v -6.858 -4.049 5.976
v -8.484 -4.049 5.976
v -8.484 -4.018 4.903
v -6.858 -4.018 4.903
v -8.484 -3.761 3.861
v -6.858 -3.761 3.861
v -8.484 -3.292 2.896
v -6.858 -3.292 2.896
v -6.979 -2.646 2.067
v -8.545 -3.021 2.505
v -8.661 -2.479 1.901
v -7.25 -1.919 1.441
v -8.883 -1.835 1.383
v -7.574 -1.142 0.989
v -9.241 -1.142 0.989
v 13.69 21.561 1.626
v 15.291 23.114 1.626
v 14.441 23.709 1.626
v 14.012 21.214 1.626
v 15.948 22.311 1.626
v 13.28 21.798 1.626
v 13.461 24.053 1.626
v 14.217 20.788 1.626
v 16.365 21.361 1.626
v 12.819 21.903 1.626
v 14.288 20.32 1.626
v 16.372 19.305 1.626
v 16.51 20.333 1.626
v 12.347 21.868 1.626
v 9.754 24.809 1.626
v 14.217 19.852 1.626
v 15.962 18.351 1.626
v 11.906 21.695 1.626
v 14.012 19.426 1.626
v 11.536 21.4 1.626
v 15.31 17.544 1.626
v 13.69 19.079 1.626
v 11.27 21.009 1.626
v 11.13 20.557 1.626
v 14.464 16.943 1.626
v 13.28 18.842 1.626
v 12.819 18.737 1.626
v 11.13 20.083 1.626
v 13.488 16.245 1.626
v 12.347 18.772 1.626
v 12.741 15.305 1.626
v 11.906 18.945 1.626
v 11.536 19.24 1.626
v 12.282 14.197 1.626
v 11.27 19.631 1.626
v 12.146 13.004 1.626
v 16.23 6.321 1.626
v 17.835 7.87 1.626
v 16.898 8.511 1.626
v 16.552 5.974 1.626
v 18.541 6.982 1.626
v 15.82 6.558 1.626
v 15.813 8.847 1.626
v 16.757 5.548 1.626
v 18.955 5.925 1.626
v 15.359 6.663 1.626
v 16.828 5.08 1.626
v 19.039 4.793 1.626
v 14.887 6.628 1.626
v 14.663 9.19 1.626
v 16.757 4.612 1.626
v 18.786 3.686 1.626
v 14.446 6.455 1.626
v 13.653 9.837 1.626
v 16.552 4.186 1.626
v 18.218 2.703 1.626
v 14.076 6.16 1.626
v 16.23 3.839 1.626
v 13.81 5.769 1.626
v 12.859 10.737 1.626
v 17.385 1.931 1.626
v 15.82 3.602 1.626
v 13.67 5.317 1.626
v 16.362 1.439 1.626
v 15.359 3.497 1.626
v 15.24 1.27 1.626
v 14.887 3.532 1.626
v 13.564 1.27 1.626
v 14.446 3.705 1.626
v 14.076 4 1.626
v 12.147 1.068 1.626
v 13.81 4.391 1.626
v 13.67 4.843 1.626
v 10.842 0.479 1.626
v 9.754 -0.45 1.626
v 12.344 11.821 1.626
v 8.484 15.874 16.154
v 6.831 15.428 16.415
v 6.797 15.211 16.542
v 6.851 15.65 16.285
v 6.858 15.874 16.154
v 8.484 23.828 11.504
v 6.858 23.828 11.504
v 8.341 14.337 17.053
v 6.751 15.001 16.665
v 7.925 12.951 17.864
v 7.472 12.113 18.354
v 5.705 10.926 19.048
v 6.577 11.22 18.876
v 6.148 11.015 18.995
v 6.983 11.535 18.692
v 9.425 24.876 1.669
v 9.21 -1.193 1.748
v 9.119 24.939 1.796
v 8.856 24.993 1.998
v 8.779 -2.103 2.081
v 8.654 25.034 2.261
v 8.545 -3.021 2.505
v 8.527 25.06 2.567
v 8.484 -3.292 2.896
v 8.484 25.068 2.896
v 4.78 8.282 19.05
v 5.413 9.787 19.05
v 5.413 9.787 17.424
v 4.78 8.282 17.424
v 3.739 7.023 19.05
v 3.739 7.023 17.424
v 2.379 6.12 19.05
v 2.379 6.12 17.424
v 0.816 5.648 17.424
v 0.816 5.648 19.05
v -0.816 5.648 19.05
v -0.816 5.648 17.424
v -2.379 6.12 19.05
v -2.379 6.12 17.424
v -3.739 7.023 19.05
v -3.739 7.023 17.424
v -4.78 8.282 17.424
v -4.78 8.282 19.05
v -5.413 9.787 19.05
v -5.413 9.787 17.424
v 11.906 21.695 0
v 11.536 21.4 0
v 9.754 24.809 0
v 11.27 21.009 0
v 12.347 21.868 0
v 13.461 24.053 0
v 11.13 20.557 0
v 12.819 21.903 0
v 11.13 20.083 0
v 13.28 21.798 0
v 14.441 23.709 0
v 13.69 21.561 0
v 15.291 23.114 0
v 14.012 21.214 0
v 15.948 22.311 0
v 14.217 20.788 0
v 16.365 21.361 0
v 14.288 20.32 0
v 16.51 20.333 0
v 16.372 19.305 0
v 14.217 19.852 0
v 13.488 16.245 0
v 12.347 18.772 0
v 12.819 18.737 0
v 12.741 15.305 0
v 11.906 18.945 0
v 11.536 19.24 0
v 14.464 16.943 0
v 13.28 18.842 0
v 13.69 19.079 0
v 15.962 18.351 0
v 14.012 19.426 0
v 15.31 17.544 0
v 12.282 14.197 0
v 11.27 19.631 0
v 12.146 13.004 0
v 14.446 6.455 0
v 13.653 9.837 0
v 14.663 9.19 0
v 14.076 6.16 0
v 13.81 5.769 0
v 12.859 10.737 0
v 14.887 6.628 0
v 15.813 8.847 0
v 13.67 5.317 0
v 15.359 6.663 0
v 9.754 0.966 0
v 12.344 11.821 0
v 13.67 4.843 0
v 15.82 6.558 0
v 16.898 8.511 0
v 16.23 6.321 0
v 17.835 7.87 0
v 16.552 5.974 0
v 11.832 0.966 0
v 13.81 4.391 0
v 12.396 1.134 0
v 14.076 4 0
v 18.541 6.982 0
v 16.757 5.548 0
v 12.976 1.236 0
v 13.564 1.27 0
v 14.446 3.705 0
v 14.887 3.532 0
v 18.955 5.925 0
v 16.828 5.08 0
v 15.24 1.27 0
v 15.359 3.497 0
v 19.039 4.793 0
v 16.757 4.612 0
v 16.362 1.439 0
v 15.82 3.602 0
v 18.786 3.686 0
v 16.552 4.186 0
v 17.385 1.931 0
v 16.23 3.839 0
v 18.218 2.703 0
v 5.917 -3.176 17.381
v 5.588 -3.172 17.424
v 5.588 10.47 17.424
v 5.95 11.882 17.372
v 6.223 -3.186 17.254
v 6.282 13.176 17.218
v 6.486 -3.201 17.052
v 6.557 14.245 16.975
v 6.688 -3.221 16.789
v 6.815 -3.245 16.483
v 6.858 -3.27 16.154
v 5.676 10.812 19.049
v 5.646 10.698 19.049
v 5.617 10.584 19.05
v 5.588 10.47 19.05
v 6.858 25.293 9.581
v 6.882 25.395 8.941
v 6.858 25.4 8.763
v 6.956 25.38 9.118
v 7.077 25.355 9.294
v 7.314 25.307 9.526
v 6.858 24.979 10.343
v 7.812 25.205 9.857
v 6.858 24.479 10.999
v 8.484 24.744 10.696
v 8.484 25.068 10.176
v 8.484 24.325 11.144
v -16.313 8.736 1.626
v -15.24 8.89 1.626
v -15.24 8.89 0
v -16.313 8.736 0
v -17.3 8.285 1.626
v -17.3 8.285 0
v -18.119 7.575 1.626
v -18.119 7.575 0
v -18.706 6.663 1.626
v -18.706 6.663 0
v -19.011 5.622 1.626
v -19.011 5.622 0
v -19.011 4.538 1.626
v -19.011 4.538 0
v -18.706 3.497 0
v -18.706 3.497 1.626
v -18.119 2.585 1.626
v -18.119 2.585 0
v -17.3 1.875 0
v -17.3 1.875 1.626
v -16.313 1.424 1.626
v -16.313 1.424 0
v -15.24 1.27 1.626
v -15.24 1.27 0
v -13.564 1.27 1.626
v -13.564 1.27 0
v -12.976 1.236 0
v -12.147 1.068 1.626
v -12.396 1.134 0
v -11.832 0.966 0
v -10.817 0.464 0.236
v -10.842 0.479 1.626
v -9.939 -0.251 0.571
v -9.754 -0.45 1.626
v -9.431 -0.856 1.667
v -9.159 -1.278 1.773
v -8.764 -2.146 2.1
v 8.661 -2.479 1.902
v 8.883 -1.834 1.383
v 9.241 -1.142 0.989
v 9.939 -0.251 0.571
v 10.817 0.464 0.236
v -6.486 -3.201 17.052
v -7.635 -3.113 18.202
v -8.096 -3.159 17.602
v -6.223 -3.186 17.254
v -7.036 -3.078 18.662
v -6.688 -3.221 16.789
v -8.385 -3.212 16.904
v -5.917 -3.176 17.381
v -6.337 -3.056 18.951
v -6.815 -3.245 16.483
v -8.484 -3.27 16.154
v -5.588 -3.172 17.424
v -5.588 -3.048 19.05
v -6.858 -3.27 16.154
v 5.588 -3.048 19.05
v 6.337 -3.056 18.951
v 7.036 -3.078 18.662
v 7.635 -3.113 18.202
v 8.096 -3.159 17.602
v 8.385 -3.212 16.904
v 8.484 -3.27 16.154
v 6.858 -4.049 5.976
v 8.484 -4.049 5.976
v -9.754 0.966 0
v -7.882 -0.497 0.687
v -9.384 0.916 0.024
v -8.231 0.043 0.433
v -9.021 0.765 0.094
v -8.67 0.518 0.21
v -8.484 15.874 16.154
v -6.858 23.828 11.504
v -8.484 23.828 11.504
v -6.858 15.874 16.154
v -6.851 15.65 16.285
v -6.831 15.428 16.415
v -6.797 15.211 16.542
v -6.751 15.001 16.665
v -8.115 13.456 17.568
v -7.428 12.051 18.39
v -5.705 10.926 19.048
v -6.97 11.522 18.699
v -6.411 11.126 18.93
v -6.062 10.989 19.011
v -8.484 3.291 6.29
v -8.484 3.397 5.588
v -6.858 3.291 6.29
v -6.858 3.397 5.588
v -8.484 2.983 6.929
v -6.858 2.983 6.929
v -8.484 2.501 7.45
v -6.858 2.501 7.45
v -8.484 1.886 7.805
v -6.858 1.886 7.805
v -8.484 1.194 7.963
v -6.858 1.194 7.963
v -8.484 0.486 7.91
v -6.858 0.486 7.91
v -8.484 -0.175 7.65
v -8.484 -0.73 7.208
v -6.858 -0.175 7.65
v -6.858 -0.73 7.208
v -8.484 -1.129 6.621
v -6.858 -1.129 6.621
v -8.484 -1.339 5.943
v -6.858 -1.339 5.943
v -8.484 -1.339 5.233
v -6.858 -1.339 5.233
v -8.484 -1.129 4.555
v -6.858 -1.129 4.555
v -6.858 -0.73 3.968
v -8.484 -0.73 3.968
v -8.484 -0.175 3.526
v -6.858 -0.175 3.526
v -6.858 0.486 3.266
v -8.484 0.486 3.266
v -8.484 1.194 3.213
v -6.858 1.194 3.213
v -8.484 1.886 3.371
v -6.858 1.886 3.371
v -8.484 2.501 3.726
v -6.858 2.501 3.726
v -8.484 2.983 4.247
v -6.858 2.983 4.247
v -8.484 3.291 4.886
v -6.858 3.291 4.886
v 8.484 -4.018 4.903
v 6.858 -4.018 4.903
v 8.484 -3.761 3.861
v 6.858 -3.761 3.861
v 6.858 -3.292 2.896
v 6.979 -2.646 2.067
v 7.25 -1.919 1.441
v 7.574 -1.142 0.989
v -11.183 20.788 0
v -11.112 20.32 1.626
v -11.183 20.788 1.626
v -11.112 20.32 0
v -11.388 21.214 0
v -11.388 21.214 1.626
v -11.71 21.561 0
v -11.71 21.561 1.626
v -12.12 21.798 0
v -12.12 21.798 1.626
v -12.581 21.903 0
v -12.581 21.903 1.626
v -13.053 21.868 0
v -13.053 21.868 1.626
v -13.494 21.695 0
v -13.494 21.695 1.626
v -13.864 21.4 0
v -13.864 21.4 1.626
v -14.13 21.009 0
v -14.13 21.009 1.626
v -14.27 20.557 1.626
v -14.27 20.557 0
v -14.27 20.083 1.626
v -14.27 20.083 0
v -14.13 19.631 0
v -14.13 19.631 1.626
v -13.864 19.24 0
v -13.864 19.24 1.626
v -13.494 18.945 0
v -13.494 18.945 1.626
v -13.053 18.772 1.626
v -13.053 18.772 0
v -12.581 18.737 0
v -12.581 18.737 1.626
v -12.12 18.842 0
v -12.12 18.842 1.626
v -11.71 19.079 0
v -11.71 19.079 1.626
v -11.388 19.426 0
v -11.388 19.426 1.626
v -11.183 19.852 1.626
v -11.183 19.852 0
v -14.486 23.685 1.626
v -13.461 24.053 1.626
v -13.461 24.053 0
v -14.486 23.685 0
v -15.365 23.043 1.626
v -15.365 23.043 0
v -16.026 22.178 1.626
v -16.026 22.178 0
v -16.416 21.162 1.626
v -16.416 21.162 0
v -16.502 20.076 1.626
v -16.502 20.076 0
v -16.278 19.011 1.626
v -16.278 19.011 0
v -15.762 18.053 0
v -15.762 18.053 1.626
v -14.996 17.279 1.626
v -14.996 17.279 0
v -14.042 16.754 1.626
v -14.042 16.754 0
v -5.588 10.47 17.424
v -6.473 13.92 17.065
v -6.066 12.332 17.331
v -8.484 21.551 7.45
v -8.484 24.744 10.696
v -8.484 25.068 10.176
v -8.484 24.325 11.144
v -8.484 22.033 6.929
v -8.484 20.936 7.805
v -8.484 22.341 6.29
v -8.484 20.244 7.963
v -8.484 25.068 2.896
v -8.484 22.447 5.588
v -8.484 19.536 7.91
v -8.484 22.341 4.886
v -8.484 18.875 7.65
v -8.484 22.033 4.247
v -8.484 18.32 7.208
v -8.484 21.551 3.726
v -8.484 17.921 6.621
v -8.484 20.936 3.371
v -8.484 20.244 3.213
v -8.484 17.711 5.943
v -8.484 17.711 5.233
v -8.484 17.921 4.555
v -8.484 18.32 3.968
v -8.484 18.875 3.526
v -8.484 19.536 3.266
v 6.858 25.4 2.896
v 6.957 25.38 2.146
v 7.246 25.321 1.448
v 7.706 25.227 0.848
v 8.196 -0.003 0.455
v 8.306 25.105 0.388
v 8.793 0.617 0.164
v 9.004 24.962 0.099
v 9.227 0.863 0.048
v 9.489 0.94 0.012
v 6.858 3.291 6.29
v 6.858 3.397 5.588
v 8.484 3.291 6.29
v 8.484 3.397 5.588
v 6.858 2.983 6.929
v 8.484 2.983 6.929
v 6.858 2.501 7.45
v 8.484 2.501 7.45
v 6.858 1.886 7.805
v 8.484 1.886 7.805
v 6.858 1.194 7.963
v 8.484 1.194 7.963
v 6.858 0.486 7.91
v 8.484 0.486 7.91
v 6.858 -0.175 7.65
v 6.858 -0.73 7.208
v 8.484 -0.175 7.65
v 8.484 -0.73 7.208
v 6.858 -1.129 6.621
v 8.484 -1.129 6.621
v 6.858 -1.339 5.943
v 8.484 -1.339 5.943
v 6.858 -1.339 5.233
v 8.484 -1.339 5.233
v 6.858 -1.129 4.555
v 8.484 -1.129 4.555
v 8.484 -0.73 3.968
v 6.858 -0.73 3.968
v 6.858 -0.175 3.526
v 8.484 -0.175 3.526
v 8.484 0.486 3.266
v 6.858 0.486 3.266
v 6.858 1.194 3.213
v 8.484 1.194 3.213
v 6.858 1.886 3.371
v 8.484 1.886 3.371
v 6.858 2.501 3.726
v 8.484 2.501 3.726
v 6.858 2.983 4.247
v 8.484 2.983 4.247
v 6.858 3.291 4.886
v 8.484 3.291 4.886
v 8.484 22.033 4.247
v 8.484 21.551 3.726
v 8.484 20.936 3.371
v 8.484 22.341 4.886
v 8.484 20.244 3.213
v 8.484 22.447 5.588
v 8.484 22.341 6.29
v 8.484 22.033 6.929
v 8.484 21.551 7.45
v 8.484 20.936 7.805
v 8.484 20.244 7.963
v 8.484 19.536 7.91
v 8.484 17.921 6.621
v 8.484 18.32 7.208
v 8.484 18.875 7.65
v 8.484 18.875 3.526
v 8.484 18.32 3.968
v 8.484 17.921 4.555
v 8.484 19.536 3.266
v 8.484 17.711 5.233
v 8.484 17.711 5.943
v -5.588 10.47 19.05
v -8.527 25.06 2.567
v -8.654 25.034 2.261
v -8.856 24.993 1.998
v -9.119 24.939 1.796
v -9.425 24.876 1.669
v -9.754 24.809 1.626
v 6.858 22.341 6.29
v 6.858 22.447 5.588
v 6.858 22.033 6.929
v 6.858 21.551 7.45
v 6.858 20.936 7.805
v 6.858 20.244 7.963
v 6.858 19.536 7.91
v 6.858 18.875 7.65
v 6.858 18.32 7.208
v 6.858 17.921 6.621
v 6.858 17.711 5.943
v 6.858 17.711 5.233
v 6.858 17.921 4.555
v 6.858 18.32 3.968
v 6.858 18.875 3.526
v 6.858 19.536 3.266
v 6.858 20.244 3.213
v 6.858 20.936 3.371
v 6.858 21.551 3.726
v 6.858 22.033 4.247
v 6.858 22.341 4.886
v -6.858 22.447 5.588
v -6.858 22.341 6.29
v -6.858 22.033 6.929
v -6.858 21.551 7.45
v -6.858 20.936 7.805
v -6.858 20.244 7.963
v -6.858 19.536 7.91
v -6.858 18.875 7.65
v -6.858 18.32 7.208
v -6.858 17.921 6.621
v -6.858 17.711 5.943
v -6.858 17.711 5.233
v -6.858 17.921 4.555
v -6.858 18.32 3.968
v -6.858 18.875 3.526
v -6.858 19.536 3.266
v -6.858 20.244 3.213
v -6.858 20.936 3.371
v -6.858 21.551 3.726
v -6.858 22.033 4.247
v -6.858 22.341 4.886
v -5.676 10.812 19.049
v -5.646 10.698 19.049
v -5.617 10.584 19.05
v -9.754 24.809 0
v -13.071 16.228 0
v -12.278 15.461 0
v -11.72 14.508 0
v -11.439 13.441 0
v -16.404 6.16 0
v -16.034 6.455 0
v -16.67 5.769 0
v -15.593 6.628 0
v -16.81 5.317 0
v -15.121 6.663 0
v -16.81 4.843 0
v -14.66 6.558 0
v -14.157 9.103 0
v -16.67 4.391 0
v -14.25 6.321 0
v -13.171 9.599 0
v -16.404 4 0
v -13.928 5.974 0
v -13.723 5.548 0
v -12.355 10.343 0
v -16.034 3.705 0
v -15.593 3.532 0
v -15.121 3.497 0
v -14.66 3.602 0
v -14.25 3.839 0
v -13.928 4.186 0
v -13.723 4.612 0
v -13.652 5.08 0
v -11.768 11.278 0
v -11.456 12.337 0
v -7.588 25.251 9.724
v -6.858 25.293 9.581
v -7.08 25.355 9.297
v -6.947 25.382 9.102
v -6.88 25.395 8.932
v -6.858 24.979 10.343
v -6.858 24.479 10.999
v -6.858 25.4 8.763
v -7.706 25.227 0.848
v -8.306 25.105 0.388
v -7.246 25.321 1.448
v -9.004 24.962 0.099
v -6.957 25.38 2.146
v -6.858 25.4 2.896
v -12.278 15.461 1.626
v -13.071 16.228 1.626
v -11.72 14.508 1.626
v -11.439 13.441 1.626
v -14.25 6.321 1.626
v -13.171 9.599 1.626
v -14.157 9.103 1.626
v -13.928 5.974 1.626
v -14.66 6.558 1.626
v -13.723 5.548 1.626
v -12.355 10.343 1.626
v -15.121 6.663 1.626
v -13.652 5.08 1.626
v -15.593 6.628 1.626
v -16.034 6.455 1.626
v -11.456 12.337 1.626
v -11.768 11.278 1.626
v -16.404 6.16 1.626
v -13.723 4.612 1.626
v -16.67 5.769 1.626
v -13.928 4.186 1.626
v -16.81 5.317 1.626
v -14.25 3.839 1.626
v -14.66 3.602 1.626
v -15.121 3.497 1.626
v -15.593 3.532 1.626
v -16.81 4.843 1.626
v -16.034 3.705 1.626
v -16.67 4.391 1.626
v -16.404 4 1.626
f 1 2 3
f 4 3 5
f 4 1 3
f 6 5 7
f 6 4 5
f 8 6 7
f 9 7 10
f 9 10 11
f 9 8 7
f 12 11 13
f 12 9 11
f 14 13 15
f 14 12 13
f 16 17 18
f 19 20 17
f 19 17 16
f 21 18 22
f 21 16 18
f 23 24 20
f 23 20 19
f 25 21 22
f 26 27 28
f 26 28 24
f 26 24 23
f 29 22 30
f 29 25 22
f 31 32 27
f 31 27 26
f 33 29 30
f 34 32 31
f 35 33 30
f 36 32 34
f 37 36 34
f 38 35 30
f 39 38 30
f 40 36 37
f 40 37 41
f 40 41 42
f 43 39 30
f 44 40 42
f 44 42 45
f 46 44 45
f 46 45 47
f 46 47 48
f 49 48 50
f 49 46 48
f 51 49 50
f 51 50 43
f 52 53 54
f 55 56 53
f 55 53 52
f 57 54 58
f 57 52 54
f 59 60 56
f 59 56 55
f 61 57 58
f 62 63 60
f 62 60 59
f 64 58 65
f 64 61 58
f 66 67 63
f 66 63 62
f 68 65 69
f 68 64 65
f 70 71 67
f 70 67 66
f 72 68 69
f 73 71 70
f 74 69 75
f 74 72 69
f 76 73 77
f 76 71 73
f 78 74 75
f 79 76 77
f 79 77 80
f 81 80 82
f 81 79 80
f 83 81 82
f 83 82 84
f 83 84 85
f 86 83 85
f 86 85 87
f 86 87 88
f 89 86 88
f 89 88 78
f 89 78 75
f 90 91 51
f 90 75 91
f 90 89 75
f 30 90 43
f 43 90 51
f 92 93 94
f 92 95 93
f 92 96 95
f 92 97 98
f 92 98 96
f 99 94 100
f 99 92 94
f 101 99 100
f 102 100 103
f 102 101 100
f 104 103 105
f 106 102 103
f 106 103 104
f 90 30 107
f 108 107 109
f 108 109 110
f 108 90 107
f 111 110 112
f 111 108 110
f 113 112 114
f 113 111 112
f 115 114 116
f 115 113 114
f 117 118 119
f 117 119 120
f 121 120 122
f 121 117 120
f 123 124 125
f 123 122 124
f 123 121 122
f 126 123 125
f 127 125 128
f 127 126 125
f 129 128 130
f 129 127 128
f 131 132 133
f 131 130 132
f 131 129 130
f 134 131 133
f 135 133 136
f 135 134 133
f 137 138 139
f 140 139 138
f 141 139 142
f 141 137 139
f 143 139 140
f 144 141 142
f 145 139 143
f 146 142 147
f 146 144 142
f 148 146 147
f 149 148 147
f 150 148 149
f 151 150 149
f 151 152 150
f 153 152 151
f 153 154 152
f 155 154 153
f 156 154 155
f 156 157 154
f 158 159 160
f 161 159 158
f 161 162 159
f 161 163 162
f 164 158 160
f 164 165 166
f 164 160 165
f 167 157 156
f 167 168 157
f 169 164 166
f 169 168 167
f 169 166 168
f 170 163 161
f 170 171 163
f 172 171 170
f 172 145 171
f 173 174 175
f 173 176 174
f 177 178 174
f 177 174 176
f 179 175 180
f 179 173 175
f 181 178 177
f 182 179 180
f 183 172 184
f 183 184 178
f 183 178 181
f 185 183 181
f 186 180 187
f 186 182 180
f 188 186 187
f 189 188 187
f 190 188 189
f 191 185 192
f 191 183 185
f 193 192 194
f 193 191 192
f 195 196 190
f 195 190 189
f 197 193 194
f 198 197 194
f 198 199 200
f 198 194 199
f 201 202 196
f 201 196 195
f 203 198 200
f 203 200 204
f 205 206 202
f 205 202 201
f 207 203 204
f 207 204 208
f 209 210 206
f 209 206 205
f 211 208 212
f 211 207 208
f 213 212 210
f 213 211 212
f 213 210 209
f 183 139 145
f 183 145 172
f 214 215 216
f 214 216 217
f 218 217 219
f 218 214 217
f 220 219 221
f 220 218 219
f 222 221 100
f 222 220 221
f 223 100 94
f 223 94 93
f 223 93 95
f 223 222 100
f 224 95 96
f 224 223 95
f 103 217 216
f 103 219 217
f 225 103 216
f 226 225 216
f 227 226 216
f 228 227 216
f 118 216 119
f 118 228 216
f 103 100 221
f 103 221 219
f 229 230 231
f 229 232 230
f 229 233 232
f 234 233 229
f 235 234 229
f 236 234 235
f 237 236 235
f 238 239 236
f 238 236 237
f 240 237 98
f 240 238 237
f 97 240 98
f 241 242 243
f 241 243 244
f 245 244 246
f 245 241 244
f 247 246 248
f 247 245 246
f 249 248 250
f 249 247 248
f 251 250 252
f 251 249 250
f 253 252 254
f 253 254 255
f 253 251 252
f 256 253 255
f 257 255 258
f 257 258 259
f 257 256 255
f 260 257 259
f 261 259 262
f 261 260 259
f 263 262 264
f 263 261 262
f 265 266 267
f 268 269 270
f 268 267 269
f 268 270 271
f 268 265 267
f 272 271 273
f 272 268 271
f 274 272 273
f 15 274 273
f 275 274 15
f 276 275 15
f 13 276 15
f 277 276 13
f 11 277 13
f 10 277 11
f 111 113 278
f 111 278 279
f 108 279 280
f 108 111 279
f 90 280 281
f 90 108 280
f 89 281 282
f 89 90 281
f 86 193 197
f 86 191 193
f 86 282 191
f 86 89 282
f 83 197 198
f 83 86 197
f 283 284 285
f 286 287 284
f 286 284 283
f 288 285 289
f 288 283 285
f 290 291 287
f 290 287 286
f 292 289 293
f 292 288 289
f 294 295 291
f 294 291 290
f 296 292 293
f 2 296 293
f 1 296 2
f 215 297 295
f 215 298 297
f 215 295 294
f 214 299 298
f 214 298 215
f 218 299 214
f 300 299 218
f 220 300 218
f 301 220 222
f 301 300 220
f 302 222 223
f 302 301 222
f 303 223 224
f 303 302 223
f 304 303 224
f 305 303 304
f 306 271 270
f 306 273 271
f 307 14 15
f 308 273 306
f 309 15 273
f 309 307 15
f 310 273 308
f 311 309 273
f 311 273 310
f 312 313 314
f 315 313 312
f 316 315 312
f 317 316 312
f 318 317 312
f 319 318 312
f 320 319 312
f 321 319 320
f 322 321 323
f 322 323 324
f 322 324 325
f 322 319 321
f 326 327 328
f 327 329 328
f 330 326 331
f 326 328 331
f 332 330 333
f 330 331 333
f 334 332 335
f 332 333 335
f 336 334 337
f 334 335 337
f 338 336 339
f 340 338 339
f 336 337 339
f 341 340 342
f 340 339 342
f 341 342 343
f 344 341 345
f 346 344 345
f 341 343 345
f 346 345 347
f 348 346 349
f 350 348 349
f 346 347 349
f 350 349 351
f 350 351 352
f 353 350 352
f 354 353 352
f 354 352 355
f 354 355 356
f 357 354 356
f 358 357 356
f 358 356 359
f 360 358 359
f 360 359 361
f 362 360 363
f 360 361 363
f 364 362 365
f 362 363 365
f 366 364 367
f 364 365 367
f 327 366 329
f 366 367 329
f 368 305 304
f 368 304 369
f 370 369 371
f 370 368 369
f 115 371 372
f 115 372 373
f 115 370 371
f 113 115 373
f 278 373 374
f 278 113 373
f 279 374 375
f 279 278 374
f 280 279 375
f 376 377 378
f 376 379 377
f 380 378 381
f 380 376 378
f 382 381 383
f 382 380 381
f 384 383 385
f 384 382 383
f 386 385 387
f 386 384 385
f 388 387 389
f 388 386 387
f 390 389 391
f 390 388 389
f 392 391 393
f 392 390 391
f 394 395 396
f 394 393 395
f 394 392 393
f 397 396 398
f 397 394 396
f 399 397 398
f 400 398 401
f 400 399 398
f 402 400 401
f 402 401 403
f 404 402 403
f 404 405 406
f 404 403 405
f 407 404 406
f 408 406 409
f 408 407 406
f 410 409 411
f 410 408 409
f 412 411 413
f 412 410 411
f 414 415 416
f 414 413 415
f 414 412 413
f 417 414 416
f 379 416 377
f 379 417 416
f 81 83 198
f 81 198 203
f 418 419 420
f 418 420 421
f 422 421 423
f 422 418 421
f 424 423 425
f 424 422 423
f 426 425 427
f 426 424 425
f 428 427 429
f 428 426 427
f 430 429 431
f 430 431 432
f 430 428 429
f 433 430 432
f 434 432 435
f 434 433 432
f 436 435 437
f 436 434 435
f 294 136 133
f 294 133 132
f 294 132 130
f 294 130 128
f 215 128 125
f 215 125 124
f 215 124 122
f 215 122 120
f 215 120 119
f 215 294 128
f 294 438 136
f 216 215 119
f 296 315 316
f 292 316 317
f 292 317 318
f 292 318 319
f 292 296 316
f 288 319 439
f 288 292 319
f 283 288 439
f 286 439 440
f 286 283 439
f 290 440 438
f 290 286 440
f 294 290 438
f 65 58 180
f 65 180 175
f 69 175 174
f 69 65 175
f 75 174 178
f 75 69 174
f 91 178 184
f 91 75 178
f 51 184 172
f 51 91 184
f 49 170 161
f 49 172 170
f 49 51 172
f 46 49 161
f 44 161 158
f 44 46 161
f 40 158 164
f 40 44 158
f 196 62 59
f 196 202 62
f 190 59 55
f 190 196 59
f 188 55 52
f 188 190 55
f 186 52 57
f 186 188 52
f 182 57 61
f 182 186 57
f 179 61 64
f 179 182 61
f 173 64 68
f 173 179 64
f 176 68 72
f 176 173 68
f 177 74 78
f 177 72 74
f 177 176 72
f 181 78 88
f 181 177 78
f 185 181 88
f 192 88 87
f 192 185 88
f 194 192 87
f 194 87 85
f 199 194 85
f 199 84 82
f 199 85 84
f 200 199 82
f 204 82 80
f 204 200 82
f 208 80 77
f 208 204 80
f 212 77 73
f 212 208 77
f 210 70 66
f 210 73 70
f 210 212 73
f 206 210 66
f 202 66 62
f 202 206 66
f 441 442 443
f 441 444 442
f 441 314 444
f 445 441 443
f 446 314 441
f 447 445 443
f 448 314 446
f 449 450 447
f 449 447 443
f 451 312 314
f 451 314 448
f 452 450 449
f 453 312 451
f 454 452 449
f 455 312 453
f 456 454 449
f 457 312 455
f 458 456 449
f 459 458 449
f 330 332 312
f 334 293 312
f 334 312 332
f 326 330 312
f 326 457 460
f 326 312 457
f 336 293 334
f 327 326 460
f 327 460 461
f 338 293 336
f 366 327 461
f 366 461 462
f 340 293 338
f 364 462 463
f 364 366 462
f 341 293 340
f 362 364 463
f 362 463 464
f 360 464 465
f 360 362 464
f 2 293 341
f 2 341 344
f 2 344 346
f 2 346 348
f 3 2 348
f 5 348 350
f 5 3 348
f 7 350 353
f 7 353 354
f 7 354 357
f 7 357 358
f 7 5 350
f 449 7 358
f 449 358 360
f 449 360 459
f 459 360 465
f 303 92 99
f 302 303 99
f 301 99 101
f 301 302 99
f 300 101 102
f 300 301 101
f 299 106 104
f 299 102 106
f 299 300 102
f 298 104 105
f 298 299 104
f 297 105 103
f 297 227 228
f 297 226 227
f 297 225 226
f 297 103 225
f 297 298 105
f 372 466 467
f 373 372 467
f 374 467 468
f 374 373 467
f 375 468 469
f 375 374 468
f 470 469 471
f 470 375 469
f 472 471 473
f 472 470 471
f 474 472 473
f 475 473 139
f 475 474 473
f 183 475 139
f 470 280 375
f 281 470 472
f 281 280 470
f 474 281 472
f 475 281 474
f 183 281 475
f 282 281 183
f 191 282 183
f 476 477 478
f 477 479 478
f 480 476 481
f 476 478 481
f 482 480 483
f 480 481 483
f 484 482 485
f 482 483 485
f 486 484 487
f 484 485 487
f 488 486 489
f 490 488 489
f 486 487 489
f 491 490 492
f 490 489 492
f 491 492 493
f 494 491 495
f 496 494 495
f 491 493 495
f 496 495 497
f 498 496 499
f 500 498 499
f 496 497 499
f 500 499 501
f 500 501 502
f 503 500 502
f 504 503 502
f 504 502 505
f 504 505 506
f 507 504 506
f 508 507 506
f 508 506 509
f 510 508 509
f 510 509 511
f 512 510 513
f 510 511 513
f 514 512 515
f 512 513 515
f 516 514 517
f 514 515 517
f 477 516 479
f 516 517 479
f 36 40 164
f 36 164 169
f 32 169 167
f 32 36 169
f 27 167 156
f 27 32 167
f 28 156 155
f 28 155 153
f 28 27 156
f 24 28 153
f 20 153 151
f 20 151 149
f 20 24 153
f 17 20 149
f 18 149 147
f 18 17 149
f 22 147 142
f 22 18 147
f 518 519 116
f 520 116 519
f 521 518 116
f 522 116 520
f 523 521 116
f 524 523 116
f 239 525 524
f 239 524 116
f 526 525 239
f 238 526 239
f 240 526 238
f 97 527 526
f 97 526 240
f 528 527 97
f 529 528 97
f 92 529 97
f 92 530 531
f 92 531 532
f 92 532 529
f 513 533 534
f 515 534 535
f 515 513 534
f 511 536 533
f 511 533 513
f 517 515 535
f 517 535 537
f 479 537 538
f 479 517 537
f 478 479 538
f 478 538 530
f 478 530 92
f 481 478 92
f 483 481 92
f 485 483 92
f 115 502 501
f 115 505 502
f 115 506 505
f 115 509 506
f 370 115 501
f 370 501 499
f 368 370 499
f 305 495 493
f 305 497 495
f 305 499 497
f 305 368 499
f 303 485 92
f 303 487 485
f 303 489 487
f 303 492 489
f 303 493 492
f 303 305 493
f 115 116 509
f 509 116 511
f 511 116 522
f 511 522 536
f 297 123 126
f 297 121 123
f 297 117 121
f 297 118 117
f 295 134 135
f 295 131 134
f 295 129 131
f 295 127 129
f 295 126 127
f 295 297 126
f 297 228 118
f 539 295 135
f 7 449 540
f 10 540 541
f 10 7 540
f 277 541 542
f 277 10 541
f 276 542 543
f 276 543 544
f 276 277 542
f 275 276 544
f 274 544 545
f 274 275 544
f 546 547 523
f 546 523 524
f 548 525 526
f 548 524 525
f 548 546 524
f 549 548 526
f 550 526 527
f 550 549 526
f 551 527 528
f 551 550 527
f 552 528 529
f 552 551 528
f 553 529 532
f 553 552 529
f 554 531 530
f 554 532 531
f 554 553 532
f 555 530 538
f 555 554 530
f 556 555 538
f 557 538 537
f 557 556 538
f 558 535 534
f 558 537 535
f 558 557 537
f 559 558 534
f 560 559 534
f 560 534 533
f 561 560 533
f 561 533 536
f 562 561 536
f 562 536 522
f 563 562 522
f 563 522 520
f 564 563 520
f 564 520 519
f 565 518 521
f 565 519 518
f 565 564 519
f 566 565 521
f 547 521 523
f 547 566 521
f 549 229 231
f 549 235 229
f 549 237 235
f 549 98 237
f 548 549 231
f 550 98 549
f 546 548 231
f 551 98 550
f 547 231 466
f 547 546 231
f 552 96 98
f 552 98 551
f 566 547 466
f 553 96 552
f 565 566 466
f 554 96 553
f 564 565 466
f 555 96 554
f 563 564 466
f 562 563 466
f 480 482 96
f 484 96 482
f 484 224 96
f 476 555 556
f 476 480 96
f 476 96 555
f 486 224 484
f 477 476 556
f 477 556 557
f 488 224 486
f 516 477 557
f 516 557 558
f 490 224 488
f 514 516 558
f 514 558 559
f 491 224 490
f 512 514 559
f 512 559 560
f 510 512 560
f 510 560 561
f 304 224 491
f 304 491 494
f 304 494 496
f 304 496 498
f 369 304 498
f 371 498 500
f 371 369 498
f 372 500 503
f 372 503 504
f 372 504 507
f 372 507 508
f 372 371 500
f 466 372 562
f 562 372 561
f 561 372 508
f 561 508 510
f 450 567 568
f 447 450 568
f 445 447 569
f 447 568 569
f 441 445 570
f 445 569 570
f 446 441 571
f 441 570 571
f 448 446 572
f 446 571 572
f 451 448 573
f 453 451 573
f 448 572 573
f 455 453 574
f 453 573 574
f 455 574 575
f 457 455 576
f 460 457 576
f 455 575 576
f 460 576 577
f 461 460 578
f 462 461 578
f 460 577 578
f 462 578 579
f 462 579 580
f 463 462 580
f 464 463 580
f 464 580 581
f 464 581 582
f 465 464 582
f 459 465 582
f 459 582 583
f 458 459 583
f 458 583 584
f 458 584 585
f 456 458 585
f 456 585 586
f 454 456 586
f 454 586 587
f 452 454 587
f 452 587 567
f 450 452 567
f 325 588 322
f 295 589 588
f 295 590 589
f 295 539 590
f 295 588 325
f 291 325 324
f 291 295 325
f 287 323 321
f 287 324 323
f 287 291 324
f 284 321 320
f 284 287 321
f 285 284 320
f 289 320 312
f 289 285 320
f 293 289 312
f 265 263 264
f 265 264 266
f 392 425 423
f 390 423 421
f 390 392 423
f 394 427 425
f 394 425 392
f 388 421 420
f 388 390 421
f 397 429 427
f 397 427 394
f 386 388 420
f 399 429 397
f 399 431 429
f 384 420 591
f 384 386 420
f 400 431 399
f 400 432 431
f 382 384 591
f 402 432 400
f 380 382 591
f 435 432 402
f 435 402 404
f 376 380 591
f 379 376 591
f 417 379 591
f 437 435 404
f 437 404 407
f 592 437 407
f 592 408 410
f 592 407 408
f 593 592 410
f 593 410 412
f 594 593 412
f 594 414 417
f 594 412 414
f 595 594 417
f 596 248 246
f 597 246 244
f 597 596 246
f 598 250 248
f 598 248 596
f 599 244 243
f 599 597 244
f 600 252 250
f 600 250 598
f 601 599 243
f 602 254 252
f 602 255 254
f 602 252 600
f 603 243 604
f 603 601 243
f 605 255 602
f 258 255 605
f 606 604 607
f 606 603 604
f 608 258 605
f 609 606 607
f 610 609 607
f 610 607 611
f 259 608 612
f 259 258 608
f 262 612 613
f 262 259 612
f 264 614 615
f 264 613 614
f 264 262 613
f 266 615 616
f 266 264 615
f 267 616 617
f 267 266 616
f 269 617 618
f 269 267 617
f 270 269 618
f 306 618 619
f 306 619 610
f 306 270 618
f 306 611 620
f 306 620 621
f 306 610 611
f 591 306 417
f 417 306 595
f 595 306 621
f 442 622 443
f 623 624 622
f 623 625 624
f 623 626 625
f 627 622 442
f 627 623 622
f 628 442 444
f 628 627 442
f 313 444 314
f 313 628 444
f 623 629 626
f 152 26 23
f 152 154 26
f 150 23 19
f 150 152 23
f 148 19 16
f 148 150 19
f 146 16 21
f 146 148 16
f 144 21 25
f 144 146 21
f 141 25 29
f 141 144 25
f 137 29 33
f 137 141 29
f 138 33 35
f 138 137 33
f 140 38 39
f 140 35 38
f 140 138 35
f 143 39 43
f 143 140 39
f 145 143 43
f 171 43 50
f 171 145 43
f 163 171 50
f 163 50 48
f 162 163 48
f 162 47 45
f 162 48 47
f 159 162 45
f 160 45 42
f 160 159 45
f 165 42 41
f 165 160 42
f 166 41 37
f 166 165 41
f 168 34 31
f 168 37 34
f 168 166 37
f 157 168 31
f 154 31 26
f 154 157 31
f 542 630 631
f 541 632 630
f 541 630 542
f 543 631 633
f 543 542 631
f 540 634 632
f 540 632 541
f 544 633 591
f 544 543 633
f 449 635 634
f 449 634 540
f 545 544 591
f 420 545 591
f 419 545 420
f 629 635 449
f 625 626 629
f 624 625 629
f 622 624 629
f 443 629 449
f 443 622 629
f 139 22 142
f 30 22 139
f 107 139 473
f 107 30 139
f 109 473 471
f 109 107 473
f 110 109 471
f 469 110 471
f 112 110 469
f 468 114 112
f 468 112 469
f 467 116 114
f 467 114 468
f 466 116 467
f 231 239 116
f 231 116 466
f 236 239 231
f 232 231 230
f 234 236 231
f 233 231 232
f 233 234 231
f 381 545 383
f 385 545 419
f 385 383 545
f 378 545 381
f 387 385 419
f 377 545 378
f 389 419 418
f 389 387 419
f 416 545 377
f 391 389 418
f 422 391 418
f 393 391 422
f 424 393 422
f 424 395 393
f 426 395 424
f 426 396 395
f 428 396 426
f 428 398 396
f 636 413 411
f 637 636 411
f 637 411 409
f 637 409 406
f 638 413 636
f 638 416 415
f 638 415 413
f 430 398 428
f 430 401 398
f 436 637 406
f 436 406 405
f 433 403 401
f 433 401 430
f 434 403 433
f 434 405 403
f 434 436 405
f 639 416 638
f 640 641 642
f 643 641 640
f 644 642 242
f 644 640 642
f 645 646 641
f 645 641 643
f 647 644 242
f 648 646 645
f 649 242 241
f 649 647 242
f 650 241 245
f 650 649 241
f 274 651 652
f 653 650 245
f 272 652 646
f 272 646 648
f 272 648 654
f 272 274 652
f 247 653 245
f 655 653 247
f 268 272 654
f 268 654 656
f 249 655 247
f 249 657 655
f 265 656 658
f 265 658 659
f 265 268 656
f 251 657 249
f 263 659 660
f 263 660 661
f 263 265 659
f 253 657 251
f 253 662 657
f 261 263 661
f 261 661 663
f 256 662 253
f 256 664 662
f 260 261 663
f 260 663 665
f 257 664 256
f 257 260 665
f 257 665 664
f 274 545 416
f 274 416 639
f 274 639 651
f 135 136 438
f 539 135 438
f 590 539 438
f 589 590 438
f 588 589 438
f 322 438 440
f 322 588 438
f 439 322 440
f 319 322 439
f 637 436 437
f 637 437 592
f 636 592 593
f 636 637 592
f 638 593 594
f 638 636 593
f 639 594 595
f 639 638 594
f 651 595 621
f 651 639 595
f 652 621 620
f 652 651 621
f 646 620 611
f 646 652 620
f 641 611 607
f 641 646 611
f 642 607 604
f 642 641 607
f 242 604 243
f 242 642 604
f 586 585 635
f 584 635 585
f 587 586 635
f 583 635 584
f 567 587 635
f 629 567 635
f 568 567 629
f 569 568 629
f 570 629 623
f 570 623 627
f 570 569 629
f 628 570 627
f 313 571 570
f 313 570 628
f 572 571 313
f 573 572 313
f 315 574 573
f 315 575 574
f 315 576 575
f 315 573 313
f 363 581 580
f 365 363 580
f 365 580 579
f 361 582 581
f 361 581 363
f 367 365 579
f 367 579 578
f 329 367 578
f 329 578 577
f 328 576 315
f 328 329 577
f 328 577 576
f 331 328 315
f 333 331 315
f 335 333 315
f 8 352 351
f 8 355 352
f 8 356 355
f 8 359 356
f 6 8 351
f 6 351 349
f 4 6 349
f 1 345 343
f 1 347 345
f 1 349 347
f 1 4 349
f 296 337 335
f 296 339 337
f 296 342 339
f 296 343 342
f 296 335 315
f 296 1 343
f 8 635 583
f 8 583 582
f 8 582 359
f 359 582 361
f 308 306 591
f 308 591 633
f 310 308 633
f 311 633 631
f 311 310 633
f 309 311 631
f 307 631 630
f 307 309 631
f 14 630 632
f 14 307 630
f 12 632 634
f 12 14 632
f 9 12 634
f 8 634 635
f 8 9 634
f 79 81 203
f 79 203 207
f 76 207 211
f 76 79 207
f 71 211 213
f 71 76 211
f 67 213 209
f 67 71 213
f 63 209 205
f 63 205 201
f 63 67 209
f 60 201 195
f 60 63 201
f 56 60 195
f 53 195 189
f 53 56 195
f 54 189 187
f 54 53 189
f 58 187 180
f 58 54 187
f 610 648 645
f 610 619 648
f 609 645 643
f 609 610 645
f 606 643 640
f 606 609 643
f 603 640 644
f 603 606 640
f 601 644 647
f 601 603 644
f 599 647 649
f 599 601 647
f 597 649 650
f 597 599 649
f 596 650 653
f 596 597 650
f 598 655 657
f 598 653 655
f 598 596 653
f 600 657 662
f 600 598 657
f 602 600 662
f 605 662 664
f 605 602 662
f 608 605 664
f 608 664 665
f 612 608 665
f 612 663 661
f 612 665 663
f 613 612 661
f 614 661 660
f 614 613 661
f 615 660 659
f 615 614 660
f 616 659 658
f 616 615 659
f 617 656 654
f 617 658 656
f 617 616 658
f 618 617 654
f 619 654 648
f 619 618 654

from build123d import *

# Parameters (mm, degrees)
F1_DEPTH = 25.4
F2_R     = 2.38125
F3_DEPTH = 12.7
F5_DEPTH = 63.5
F6_R     = 1.5875
F7_DEPTH = 63.5


with BuildPart() as f1:
    # F0 (on Front) → F1 (new body, symmetric)
    with BuildSketch(Plane.XZ):
        with BuildLine():
            Line((-33.1002511084, 1.6256), (-33.1002511084, 0))
            Line((-33.1002511084, 0), (-9.7536, 0))
            ThreePointArc((-9.7536, 0), (-7.7061016044, 0.8481016044), (-6.858, 2.8956))
            Line((-6.858, 2.8956), (-6.858, 16.1544))
            ThreePointArc((-6.858, 16.1544), (-6.4860256121, 17.0524256121), (-5.588, 17.4244))
            Line((-5.588, 17.4244), (5.588, 17.4244))
            ThreePointArc((5.588, 17.4244), (6.4860256121, 17.0524256121), (6.858, 16.1544))
            Line((6.858, 16.1544), (6.858, 2.8956))
            ThreePointArc((6.858, 2.8956), (7.7061016044, 0.8481016044), (9.7536, 0))
            Line((9.7536, 0), (35.6136485934, 0))
            Line((35.6136485934, 0), (35.6136485934, 1.6256))
            Line((35.6136485934, 1.6256), (9.7536, 1.6256))
            ThreePointArc((9.7536, 1.6256), (8.8555743879, 1.9975743879), (8.4836, 2.8956))
            Line((8.4836, 2.8956), (8.4836, 16.1544))
            ThreePointArc((8.4836, 16.1544), (7.6354983956, 18.2018983956), (5.588, 19.05))
            Line((5.588, 19.05), (-5.588, 19.05))
            ThreePointArc((-5.588, 19.05), (-7.6354983956, 18.2018983956), (-8.4836, 16.1544))
            Line((-8.4836, 16.1544), (-8.4836, 2.8956))
            ThreePointArc((-8.4836, 2.8956), (-8.8555743879, 1.9975743879), (-9.7536, 1.6256))
            Line((-9.7536, 1.6256), (-33.1002511084, 1.6256))
        make_face()
    extrude(amount=F1_DEPTH, both=True)

    # F2 (on Right) → F3 (cut, symmetric)
    with BuildSketch(Plane.YZ):
        with Locations((20.066, 5.588)):
            Circle(F2_R)
        with Locations((1.016, 5.588)):
            Circle(F2_R)
    extrude(amount=F3_DEPTH, both=True, mode=Mode.SUBTRACT)

    # F4 (on Right) → F5 (intersect, symmetric)
    with BuildSketch(Plane.YZ):
        with BuildLine():
            Line((-3.048, 19.05), (-4.0491707322, 5.9758729865))
            ThreePointArc((-4.0491707322, 5.9758729865), (-3.3726807453, 3.0295079996), (-1.142046819, 0.9891703742))
            Line((-1.142046819, 0.9891703742), (0.9658898494, 0))
            Line((0.9658898494, 0), (0.9658898494, -3.7190427538))
            Line((0.9658898494, -3.7190427538), (25.4, -3.7190427538))
            Line((25.4, -3.7190427538), (25.4, 0))
            Line((25.4, 0), (25.4, 8.763))
            ThreePointArc((25.4, 8.763), (24.9789926145, 10.3429207827), (23.8276222491, 11.5038441996))
            Line((23.8276222491, 11.5038441996), (10.922, 19.05))
            Line((10.922, 19.05), (-3.048, 19.05))
        make_face()
    extrude(amount=F5_DEPTH, both=True, mode=Mode.INTERSECT)

    # F6 (on Top) → F7 (intersect, symmetric)
    with BuildSketch(Plane.XY):
        with BuildLine():
            ThreePointArc((-14.0419021, 16.754134221), (-11.4555767164, 12.3367765251), (-15.24, 8.89))
            ThreePointArc((-15.24, 8.89), (-19.05, 5.08), (-15.24, 1.27))
            Line((-15.24, 1.27), (-13.5636, 1.27))
            ThreePointArc((-13.5636, 1.27), (-9.9714975516, -0.2178975516), (-8.4836, -3.81))
            Line((-8.4836, -3.81), (-8.4836, -8.5270870477))
            Line((-8.4836, -8.5270870477), (8.4836, -8.5270870477))
            Line((8.4836, -8.5270870477), (8.4836, -3.81))
            ThreePointArc((8.4836, -3.81), (9.9714975516, -0.2178975516), (13.5636, 1.27))
            Line((13.5636, 1.27), (15.24, 1.27))
            ThreePointArc((15.24, 1.27), (19.0391423785, 4.7925679424), (15.8132258851, 8.8466313975))
            ThreePointArc((15.8132258851, 8.8466313975), (12.203632925, 12.4056054875), (14.4638508851, 16.9428813975))
            ThreePointArc((14.4638508851, 16.9428813975), (16.4726911093, 20.8518851319), (13.4614256967, 24.0531395512))
            Line((13.4614256967, 24.0531395512), (6.858, 25.4))
            Line((6.858, 25.4), (6.858, 15.8741267216))
            add(Edge.make_bspline(
                [(6.7508981156, 15.0011278174), (6.858, 15.4184115393), (6.858, 15.8741267216)],
                knots=[4.2987589202, 4.2987589202, 4.2987589202, 4.7123889804, 4.7123889804, 4.7123889804], degree=2, weights=[1, 0.9786898915, 1]))
            Line((6.7508981156, 15.0011278174), (5.4125625526, 9.7867877722))
            ThreePointArc((5.4125625526, 9.7867877722), (0, 5.588), (-5.4125625526, 9.7867877722))
            Line((-5.4125625526, 9.7867877722), (-6.7508981156, 15.0011278174))
            Line((-6.7508981156, 15.0011278174), (-6.858, 15.4184115393))
            Line((-6.858, 15.4184115393), (-6.858, 15.8741267216))
            Line((-6.858, 15.8741267216), (-6.858, 25.4))
            Line((-6.858, 25.4), (-13.4614256967, 24.0531395512))
            ThreePointArc((-13.4614256967, 24.0531395512), (-16.4980082488, 20.6220485762), (-14.0419021, 16.754134221))
        make_face()
        with Locations((-15.24, 5.08)):
            Circle(F6_R, mode=Mode.SUBTRACT)
        with Locations((15.24, 5.08)):
            Circle(F6_R, mode=Mode.SUBTRACT)
        with Locations((-12.7, 20.32)):
            Circle(F6_R, mode=Mode.SUBTRACT)
        with Locations((12.7, 20.32)):
            Circle(F6_R, mode=Mode.SUBTRACT)
        with BuildLine():
            add(Edge.make_bspline(
                [(-6.858, 15.8741267216), (-6.858, 15.4184115393), (-6.7508981156, 15.0011278174)],
                knots=[1.5707963268, 1.5707963268, 1.5707963268, 1.984426387, 1.984426387, 1.984426387], degree=2, weights=[1, 0.9786898915, 1]))
            Line((-6.858, 15.8741267216), (-6.858, 15.4184115393))
            Line((-6.858, 15.4184115393), (-6.7508981156, 15.0011278174))
        make_face()
    extrude(amount=F7_DEPTH, both=True, mode=Mode.INTERSECT)


solid = f1.part
